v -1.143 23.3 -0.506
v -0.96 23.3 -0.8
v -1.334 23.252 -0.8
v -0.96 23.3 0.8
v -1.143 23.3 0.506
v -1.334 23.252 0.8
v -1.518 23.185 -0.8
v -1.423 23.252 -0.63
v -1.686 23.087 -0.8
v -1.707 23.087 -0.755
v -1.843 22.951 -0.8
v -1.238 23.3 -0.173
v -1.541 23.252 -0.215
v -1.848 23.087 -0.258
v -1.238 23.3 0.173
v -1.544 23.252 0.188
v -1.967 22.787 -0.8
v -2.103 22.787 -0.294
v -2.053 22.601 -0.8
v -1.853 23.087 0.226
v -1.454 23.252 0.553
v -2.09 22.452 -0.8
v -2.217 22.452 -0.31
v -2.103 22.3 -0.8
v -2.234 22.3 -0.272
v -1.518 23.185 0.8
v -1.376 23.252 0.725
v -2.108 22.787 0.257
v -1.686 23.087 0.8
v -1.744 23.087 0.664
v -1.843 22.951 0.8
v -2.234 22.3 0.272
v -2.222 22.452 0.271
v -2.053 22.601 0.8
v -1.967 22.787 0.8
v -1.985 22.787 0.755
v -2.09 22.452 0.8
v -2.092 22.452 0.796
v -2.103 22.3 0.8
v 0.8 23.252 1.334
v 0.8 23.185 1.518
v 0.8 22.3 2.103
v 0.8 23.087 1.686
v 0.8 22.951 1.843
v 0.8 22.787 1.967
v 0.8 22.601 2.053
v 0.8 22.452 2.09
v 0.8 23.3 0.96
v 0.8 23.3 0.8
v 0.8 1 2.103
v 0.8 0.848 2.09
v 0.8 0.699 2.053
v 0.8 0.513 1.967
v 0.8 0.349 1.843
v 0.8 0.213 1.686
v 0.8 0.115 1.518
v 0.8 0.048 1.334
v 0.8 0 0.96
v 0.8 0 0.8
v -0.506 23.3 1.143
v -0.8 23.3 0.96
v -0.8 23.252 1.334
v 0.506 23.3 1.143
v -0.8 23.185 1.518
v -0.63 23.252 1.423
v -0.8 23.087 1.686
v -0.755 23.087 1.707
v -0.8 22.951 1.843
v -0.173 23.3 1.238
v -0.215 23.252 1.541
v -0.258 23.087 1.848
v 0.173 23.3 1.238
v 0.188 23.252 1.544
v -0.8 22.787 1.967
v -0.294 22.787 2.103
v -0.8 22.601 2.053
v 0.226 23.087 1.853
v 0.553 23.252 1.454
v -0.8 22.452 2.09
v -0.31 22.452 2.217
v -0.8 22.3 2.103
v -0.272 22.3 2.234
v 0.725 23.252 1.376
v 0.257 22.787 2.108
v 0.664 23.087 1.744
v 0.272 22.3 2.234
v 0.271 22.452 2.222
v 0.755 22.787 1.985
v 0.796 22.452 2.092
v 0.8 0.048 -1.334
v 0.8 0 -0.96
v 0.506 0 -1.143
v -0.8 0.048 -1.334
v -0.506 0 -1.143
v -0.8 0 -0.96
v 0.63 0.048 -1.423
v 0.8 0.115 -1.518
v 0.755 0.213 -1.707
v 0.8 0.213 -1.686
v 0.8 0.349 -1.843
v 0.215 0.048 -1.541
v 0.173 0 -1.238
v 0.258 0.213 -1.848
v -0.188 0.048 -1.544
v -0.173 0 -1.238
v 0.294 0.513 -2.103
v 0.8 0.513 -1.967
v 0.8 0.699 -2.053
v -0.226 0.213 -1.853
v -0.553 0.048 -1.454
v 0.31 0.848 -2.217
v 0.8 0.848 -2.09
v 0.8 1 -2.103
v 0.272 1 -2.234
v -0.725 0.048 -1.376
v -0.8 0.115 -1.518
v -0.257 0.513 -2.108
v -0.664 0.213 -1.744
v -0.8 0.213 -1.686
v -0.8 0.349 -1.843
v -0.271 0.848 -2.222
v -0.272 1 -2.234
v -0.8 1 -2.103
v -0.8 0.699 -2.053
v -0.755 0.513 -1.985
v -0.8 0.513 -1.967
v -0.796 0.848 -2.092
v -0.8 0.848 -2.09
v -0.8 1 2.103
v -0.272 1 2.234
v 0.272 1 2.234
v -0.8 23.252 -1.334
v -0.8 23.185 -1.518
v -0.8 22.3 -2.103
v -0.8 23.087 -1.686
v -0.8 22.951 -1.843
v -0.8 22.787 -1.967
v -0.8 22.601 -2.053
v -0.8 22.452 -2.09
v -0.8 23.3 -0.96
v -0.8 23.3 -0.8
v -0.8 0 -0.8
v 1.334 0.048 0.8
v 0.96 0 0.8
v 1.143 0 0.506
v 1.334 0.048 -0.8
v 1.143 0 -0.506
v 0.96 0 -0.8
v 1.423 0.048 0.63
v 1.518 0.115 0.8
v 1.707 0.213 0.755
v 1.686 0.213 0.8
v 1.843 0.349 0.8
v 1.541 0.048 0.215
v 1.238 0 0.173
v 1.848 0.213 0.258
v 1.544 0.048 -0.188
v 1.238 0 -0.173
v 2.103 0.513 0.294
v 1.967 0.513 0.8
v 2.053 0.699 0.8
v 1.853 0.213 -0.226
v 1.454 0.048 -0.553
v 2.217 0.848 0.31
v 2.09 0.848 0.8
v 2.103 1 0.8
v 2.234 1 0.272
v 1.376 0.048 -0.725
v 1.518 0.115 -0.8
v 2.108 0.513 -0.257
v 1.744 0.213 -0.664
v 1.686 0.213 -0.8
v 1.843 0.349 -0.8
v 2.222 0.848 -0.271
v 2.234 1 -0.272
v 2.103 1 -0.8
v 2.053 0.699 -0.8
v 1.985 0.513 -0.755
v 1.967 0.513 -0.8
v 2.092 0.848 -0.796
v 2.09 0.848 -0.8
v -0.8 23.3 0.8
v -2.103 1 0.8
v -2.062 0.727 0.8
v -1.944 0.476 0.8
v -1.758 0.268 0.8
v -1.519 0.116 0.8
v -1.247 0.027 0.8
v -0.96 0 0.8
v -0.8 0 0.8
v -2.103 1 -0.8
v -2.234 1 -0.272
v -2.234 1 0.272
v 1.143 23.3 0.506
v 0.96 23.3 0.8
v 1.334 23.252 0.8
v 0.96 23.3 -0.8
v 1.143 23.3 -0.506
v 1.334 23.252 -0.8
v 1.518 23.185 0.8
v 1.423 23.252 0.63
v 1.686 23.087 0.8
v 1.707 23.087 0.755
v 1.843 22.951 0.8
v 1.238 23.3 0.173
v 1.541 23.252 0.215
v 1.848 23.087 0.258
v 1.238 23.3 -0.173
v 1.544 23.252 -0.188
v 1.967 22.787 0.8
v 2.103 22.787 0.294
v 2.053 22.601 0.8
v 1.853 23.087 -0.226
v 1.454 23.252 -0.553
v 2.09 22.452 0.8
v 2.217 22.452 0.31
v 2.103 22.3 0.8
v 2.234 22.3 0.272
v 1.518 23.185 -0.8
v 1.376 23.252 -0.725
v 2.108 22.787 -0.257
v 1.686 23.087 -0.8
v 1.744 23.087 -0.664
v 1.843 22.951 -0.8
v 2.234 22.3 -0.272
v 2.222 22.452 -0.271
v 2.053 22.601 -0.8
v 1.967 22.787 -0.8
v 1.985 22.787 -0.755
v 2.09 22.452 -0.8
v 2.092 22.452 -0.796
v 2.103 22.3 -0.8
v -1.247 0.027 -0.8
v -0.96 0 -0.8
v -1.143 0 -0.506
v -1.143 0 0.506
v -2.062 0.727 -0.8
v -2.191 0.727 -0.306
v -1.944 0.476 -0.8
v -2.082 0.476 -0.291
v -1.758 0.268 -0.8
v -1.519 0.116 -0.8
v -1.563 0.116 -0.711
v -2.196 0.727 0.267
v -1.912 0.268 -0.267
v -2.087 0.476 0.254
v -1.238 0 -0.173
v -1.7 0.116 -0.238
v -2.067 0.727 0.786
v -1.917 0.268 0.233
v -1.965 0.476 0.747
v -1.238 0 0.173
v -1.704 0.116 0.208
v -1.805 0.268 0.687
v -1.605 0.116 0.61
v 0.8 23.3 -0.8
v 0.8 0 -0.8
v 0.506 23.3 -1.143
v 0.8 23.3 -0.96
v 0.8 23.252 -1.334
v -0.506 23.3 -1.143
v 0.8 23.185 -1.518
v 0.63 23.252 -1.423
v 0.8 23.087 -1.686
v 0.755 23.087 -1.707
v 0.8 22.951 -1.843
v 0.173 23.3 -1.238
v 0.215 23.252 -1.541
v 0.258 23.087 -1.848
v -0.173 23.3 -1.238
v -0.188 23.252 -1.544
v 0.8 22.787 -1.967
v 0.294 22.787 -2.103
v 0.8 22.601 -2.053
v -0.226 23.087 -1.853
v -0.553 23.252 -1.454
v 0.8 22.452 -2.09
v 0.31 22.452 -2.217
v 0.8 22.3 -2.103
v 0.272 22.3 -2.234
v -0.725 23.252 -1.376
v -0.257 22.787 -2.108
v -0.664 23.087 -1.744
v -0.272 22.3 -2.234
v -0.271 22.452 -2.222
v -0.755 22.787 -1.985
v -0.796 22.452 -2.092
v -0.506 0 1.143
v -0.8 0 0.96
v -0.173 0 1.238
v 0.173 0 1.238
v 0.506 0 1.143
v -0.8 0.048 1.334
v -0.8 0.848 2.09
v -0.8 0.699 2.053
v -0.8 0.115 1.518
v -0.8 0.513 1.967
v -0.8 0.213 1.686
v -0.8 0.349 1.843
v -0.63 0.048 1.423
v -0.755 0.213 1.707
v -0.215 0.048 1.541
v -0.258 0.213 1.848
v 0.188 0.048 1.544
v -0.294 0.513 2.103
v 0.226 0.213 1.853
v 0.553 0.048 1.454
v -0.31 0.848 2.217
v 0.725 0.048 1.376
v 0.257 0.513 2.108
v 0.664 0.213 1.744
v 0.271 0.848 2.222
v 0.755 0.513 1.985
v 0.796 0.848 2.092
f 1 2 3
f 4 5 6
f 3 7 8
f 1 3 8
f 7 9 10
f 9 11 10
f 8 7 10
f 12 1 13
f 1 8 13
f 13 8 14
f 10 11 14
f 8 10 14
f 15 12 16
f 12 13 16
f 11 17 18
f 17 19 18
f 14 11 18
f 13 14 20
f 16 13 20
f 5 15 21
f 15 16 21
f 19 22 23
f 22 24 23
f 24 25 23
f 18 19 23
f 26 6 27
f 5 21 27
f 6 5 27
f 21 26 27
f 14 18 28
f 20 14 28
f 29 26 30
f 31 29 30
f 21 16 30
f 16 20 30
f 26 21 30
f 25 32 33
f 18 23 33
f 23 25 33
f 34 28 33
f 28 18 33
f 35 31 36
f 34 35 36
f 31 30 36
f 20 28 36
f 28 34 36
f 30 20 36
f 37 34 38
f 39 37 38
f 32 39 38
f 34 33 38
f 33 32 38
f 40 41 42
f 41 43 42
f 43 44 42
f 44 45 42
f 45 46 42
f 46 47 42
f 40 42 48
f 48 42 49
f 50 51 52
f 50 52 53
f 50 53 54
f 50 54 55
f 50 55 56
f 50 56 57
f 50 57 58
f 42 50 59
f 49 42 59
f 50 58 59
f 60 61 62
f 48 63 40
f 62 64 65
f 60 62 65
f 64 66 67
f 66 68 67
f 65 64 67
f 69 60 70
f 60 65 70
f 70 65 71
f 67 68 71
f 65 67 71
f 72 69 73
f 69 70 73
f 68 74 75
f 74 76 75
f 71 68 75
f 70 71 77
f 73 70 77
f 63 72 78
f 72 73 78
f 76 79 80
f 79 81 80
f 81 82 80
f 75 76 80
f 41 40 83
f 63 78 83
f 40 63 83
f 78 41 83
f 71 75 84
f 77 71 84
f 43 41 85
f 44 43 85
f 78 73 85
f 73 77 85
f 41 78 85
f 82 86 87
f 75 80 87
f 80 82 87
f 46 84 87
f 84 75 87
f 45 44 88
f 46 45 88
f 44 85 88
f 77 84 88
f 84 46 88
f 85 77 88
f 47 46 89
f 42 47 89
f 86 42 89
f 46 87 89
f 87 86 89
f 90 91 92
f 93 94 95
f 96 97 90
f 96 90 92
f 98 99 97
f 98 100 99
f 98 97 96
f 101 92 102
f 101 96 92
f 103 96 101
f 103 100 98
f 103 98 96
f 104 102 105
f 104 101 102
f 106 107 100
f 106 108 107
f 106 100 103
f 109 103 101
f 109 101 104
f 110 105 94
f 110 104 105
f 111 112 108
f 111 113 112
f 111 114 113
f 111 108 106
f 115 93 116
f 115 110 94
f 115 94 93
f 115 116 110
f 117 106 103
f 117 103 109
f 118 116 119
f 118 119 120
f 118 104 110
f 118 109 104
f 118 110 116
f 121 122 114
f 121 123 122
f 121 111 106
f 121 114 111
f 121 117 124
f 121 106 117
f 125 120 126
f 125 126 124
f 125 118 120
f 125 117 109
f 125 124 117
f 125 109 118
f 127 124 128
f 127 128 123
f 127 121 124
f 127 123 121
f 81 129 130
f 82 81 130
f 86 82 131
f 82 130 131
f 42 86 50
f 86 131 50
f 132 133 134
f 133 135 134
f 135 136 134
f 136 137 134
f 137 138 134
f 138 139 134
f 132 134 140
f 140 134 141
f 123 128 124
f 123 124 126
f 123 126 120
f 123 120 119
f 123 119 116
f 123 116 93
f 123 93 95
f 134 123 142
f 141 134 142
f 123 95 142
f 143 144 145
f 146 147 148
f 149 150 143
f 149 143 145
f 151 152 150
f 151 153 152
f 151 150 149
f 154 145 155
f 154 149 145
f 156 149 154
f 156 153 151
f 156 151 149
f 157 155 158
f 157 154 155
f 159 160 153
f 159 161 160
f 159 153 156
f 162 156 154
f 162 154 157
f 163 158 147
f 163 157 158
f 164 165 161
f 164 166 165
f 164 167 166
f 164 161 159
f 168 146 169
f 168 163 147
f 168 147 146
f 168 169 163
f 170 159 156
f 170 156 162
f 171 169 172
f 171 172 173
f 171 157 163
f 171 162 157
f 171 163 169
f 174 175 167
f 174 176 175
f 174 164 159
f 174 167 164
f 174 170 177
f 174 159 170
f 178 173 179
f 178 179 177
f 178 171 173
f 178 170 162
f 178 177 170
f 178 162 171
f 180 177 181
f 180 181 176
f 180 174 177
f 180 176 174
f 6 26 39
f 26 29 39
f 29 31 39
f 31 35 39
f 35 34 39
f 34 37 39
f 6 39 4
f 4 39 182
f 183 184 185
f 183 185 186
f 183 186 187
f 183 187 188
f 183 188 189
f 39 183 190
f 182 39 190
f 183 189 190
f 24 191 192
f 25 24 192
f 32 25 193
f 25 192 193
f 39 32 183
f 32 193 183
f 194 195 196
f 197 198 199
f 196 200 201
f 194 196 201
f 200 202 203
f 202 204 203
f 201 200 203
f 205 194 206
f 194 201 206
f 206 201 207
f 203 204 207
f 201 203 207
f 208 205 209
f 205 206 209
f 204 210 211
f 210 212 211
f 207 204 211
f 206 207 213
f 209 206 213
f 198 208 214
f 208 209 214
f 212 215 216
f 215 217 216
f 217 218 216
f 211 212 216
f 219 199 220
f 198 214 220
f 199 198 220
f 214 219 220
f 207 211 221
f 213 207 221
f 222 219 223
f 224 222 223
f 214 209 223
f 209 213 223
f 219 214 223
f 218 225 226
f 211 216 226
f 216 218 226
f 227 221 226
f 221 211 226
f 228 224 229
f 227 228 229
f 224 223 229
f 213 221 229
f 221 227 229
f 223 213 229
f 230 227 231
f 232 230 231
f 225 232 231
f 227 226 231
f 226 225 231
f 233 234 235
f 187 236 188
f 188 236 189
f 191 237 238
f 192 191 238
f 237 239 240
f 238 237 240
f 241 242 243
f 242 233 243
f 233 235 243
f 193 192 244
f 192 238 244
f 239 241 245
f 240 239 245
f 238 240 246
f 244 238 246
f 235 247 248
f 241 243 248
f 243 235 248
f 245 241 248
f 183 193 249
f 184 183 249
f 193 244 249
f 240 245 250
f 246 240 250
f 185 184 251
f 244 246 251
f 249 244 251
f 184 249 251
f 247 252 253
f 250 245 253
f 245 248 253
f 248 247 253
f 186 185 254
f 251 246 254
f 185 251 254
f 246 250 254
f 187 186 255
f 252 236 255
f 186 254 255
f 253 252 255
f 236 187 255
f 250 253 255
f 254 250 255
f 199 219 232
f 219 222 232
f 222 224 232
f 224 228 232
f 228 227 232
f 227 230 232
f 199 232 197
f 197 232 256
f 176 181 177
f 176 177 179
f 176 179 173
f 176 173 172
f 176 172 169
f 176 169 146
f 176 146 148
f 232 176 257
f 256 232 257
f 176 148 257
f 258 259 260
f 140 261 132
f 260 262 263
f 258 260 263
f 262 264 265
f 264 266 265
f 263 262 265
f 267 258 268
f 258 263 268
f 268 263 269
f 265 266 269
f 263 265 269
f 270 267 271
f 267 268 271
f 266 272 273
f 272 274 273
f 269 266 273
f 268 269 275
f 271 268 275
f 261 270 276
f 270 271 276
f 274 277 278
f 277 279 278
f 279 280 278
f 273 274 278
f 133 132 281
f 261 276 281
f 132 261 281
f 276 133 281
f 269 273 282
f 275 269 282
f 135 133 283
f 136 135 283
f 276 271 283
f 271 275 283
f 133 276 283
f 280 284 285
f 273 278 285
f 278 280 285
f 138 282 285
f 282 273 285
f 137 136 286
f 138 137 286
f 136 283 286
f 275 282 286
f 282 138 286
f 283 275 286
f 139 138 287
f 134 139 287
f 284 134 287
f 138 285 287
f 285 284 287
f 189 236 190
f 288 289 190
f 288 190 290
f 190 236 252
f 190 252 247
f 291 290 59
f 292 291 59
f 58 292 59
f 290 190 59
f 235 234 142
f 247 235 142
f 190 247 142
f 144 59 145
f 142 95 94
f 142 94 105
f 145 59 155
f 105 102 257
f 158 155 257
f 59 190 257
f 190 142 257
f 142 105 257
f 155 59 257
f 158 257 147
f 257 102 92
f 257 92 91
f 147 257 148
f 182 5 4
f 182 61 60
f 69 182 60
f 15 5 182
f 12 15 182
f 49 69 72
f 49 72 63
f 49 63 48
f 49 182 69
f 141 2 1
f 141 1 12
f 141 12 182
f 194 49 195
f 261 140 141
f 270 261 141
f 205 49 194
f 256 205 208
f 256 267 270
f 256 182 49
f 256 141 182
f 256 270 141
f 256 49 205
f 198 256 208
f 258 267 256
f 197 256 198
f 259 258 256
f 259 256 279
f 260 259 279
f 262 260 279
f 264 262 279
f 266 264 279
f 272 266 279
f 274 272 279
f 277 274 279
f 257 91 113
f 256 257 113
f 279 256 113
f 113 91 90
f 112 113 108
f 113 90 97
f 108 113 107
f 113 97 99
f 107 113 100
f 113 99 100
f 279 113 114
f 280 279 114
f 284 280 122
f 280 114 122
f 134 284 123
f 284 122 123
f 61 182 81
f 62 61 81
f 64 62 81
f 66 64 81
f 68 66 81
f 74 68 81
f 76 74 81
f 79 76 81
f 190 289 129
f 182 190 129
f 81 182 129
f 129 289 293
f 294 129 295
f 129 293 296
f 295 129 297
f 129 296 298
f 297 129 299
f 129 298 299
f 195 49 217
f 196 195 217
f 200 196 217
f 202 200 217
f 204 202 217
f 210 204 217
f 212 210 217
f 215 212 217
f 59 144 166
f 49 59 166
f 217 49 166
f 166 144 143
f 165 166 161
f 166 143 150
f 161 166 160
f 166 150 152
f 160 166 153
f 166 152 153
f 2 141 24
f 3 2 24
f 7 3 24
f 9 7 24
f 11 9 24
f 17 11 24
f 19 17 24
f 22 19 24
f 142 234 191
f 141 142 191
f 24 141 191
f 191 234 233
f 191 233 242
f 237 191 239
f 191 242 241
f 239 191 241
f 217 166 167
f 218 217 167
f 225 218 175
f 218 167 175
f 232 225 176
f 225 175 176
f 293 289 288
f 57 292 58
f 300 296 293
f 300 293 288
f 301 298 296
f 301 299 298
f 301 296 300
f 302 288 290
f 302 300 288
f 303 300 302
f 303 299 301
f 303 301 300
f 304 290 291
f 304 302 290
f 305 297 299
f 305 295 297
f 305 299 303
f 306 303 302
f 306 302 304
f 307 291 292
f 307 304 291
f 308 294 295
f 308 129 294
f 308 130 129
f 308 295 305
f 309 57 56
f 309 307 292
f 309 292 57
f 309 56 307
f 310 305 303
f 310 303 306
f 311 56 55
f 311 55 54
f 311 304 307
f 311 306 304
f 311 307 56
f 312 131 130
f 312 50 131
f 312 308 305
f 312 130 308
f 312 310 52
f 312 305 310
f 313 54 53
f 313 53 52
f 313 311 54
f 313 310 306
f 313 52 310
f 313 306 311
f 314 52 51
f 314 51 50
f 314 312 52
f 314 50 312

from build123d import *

# Parameters (mm, degrees)
BOSS_EXTRUDE1_DEPTH = 23.3
FILLET1_R           = 1
FILLET2_R           = 1
FILLET3_R           = 1
FILLET4_R           = 1
FILLET20_R          = 1
FILLET21_R          = 1
FILLET22_R          = 1
FILLET23_R          = 1


with BuildPart() as part:
    # Sketch1 → Boss-Extrude1 (new body)
    with BuildSketch(Plane(origin=(0, 0, 0), x_dir=(1, 0, 0), z_dir=(0, 1, 0))):
        with BuildLine():
            Line((-0.8, -0.8), (-0.8, -2.102974084))
            ThreePointArc((-0.8, -2.102974084), (0, -2.25), (0.8, -2.102974084))
            Line((0.8, -2.102974084), (0.8, -0.8))
            Line((0.8, -0.8), (2.102974084, -0.8))
            ThreePointArc((2.102974084, -0.8), (2.25, 0), (2.102974084, 0.8))
            Line((2.102974084, 0.8), (0.8, 0.8))
            Line((0.8, 0.8), (0.8, 2.102974084))
            ThreePointArc((0.8, 2.102974084), (0, 2.25), (-0.8, 2.102974084))
            Line((-0.8, 2.102974084), (-0.8, 0.8))
            Line((-0.8, 0.8), (-2.102974084, 0.8))
            ThreePointArc((-2.102974084, 0.8), (-2.25, 0), (-2.102974084, -0.8))
            Line((-2.102974084, -0.8), (-0.8, -0.8))
        make_face()
    extrude(amount=BOSS_EXTRUDE1_DEPTH)

    # Fillet1
    fillet1_edges = [part.edges().sort_by_distance(p)[0] for p in [
        (-2.25, 0, 0),
    ]]
    fillet(fillet1_edges, radius=FILLET1_R)

    # Fillet2
    fillet2_edges = [part.edges().sort_by_distance(p)[0] for p in [
        (0, 0, 2.25),
    ]]
    fillet(fillet2_edges, radius=FILLET2_R)

    # Fillet3
    fillet3_edges = [part.edges().sort_by_distance(p)[0] for p in [
        (2.25, 0, 0),
    ]]
    fillet(fillet3_edges, radius=FILLET3_R)

    # Fillet4
    fillet4_edges = [part.edges().sort_by_distance(p)[0] for p in [
        (0, 0, -2.25),
    ]]
    fillet(fillet4_edges, radius=FILLET4_R)

    # Fillet20
    fillet20_edges = [part.edges().sort_by_distance(p)[0] for p in [
        (2.25, 23.3, 0),
    ]]
    fillet(fillet20_edges, radius=FILLET20_R)

    # Fillet21
    fillet21_edges = [part.edges().sort_by_distance(p)[0] for p in [
        (0, 23.3, 2.25),
    ]]
    fillet(fillet21_edges, radius=FILLET21_R)

    # Fillet22
    fillet22_edges = [part.edges().sort_by_distance(p)[0] for p in [
        (-2.25, 23.3, 0),
    ]]
    fillet(fillet22_edges, radius=FILLET22_R)

    # Fillet23
    fillet23_edges = [part.edges().sort_by_distance(p)[0] for p in [
        (0, 23.3, -2.25),
    ]]
    fillet(fillet23_edges, radius=FILLET23_R)


solid = part.part
